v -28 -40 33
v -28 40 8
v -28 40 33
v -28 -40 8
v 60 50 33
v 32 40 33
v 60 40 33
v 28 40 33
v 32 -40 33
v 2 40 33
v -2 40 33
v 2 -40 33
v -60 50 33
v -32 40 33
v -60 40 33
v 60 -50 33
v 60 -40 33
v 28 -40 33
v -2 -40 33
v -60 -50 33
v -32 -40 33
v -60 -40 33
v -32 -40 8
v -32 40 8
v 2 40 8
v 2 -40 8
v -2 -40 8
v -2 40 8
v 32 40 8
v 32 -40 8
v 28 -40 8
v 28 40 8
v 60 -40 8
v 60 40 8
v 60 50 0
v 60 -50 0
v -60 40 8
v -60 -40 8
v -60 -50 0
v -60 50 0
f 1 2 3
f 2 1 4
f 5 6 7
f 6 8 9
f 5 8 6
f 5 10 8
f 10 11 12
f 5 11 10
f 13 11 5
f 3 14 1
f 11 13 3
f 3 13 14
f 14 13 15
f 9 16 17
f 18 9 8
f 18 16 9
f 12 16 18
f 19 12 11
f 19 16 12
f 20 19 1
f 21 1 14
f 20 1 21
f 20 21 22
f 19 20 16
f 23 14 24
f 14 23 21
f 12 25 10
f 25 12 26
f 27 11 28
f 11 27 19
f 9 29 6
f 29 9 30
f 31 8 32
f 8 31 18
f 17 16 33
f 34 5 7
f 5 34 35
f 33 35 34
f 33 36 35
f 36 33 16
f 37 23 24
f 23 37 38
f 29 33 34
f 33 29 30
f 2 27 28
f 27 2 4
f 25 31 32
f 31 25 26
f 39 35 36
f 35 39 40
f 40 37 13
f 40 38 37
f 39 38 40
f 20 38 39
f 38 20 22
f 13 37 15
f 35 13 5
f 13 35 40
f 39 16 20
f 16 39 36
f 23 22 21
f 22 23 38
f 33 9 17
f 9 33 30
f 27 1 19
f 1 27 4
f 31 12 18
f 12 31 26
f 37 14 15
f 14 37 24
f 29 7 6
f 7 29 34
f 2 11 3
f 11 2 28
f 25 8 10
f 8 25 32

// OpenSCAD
$fn = 32;

// ----------------------------------------------------------------------
// Rib frame 120 x 100 x 33
// 3 ribs at 30 mm pitch
// ----------------------------------------------------------------------

// --- parameters (mm) ---
frame = [120, 100, 8];  // base plate size (x, y, z)
rail_w = 10;            // side rail width
ribs = 3;               // number of ribs
rib_t = 4;              // rib thickness
rib_h = 25;             // rib height above the base plate
pitch = 30;             // pitch between rib centres

// --- derived feature positions (mm) ---
span = (ribs - 1) * pitch;          // = 60   distance between the outer ribs
origin_x = -span / 2;               // = -30   X of the first rib
rib_len = frame[1] - 2 * rail_w + 2;  // = 82   rib length, 1 mm into each rail
feature_centers = [
  [origin_x + 0 * pitch, 0],
  [origin_x + 1 * pitch, 0],
  [origin_x + 2 * pitch, 0]
];   // rib centre line, drives the rib loop

// base plate, two side rails, then the ribs read straight off feature_centers
union() {
  translate([-frame[0] / 2, -frame[1] / 2, 0]) cube(frame);
  translate([-frame[0] / 2, -frame[1] / 2, 0]) cube([frame[0], rail_w, frame[2] + rib_h]);
  translate([-frame[0] / 2, frame[1] / 2 - rail_w, 0]) cube([frame[0], rail_w, frame[2] + rib_h]);
  for (centre = feature_centers)
    translate([centre[0] - rib_t / 2, centre[1] - rib_len / 2, frame[2] - 1])
      cube([rib_t, rib_len, rib_h + 1]);
}
